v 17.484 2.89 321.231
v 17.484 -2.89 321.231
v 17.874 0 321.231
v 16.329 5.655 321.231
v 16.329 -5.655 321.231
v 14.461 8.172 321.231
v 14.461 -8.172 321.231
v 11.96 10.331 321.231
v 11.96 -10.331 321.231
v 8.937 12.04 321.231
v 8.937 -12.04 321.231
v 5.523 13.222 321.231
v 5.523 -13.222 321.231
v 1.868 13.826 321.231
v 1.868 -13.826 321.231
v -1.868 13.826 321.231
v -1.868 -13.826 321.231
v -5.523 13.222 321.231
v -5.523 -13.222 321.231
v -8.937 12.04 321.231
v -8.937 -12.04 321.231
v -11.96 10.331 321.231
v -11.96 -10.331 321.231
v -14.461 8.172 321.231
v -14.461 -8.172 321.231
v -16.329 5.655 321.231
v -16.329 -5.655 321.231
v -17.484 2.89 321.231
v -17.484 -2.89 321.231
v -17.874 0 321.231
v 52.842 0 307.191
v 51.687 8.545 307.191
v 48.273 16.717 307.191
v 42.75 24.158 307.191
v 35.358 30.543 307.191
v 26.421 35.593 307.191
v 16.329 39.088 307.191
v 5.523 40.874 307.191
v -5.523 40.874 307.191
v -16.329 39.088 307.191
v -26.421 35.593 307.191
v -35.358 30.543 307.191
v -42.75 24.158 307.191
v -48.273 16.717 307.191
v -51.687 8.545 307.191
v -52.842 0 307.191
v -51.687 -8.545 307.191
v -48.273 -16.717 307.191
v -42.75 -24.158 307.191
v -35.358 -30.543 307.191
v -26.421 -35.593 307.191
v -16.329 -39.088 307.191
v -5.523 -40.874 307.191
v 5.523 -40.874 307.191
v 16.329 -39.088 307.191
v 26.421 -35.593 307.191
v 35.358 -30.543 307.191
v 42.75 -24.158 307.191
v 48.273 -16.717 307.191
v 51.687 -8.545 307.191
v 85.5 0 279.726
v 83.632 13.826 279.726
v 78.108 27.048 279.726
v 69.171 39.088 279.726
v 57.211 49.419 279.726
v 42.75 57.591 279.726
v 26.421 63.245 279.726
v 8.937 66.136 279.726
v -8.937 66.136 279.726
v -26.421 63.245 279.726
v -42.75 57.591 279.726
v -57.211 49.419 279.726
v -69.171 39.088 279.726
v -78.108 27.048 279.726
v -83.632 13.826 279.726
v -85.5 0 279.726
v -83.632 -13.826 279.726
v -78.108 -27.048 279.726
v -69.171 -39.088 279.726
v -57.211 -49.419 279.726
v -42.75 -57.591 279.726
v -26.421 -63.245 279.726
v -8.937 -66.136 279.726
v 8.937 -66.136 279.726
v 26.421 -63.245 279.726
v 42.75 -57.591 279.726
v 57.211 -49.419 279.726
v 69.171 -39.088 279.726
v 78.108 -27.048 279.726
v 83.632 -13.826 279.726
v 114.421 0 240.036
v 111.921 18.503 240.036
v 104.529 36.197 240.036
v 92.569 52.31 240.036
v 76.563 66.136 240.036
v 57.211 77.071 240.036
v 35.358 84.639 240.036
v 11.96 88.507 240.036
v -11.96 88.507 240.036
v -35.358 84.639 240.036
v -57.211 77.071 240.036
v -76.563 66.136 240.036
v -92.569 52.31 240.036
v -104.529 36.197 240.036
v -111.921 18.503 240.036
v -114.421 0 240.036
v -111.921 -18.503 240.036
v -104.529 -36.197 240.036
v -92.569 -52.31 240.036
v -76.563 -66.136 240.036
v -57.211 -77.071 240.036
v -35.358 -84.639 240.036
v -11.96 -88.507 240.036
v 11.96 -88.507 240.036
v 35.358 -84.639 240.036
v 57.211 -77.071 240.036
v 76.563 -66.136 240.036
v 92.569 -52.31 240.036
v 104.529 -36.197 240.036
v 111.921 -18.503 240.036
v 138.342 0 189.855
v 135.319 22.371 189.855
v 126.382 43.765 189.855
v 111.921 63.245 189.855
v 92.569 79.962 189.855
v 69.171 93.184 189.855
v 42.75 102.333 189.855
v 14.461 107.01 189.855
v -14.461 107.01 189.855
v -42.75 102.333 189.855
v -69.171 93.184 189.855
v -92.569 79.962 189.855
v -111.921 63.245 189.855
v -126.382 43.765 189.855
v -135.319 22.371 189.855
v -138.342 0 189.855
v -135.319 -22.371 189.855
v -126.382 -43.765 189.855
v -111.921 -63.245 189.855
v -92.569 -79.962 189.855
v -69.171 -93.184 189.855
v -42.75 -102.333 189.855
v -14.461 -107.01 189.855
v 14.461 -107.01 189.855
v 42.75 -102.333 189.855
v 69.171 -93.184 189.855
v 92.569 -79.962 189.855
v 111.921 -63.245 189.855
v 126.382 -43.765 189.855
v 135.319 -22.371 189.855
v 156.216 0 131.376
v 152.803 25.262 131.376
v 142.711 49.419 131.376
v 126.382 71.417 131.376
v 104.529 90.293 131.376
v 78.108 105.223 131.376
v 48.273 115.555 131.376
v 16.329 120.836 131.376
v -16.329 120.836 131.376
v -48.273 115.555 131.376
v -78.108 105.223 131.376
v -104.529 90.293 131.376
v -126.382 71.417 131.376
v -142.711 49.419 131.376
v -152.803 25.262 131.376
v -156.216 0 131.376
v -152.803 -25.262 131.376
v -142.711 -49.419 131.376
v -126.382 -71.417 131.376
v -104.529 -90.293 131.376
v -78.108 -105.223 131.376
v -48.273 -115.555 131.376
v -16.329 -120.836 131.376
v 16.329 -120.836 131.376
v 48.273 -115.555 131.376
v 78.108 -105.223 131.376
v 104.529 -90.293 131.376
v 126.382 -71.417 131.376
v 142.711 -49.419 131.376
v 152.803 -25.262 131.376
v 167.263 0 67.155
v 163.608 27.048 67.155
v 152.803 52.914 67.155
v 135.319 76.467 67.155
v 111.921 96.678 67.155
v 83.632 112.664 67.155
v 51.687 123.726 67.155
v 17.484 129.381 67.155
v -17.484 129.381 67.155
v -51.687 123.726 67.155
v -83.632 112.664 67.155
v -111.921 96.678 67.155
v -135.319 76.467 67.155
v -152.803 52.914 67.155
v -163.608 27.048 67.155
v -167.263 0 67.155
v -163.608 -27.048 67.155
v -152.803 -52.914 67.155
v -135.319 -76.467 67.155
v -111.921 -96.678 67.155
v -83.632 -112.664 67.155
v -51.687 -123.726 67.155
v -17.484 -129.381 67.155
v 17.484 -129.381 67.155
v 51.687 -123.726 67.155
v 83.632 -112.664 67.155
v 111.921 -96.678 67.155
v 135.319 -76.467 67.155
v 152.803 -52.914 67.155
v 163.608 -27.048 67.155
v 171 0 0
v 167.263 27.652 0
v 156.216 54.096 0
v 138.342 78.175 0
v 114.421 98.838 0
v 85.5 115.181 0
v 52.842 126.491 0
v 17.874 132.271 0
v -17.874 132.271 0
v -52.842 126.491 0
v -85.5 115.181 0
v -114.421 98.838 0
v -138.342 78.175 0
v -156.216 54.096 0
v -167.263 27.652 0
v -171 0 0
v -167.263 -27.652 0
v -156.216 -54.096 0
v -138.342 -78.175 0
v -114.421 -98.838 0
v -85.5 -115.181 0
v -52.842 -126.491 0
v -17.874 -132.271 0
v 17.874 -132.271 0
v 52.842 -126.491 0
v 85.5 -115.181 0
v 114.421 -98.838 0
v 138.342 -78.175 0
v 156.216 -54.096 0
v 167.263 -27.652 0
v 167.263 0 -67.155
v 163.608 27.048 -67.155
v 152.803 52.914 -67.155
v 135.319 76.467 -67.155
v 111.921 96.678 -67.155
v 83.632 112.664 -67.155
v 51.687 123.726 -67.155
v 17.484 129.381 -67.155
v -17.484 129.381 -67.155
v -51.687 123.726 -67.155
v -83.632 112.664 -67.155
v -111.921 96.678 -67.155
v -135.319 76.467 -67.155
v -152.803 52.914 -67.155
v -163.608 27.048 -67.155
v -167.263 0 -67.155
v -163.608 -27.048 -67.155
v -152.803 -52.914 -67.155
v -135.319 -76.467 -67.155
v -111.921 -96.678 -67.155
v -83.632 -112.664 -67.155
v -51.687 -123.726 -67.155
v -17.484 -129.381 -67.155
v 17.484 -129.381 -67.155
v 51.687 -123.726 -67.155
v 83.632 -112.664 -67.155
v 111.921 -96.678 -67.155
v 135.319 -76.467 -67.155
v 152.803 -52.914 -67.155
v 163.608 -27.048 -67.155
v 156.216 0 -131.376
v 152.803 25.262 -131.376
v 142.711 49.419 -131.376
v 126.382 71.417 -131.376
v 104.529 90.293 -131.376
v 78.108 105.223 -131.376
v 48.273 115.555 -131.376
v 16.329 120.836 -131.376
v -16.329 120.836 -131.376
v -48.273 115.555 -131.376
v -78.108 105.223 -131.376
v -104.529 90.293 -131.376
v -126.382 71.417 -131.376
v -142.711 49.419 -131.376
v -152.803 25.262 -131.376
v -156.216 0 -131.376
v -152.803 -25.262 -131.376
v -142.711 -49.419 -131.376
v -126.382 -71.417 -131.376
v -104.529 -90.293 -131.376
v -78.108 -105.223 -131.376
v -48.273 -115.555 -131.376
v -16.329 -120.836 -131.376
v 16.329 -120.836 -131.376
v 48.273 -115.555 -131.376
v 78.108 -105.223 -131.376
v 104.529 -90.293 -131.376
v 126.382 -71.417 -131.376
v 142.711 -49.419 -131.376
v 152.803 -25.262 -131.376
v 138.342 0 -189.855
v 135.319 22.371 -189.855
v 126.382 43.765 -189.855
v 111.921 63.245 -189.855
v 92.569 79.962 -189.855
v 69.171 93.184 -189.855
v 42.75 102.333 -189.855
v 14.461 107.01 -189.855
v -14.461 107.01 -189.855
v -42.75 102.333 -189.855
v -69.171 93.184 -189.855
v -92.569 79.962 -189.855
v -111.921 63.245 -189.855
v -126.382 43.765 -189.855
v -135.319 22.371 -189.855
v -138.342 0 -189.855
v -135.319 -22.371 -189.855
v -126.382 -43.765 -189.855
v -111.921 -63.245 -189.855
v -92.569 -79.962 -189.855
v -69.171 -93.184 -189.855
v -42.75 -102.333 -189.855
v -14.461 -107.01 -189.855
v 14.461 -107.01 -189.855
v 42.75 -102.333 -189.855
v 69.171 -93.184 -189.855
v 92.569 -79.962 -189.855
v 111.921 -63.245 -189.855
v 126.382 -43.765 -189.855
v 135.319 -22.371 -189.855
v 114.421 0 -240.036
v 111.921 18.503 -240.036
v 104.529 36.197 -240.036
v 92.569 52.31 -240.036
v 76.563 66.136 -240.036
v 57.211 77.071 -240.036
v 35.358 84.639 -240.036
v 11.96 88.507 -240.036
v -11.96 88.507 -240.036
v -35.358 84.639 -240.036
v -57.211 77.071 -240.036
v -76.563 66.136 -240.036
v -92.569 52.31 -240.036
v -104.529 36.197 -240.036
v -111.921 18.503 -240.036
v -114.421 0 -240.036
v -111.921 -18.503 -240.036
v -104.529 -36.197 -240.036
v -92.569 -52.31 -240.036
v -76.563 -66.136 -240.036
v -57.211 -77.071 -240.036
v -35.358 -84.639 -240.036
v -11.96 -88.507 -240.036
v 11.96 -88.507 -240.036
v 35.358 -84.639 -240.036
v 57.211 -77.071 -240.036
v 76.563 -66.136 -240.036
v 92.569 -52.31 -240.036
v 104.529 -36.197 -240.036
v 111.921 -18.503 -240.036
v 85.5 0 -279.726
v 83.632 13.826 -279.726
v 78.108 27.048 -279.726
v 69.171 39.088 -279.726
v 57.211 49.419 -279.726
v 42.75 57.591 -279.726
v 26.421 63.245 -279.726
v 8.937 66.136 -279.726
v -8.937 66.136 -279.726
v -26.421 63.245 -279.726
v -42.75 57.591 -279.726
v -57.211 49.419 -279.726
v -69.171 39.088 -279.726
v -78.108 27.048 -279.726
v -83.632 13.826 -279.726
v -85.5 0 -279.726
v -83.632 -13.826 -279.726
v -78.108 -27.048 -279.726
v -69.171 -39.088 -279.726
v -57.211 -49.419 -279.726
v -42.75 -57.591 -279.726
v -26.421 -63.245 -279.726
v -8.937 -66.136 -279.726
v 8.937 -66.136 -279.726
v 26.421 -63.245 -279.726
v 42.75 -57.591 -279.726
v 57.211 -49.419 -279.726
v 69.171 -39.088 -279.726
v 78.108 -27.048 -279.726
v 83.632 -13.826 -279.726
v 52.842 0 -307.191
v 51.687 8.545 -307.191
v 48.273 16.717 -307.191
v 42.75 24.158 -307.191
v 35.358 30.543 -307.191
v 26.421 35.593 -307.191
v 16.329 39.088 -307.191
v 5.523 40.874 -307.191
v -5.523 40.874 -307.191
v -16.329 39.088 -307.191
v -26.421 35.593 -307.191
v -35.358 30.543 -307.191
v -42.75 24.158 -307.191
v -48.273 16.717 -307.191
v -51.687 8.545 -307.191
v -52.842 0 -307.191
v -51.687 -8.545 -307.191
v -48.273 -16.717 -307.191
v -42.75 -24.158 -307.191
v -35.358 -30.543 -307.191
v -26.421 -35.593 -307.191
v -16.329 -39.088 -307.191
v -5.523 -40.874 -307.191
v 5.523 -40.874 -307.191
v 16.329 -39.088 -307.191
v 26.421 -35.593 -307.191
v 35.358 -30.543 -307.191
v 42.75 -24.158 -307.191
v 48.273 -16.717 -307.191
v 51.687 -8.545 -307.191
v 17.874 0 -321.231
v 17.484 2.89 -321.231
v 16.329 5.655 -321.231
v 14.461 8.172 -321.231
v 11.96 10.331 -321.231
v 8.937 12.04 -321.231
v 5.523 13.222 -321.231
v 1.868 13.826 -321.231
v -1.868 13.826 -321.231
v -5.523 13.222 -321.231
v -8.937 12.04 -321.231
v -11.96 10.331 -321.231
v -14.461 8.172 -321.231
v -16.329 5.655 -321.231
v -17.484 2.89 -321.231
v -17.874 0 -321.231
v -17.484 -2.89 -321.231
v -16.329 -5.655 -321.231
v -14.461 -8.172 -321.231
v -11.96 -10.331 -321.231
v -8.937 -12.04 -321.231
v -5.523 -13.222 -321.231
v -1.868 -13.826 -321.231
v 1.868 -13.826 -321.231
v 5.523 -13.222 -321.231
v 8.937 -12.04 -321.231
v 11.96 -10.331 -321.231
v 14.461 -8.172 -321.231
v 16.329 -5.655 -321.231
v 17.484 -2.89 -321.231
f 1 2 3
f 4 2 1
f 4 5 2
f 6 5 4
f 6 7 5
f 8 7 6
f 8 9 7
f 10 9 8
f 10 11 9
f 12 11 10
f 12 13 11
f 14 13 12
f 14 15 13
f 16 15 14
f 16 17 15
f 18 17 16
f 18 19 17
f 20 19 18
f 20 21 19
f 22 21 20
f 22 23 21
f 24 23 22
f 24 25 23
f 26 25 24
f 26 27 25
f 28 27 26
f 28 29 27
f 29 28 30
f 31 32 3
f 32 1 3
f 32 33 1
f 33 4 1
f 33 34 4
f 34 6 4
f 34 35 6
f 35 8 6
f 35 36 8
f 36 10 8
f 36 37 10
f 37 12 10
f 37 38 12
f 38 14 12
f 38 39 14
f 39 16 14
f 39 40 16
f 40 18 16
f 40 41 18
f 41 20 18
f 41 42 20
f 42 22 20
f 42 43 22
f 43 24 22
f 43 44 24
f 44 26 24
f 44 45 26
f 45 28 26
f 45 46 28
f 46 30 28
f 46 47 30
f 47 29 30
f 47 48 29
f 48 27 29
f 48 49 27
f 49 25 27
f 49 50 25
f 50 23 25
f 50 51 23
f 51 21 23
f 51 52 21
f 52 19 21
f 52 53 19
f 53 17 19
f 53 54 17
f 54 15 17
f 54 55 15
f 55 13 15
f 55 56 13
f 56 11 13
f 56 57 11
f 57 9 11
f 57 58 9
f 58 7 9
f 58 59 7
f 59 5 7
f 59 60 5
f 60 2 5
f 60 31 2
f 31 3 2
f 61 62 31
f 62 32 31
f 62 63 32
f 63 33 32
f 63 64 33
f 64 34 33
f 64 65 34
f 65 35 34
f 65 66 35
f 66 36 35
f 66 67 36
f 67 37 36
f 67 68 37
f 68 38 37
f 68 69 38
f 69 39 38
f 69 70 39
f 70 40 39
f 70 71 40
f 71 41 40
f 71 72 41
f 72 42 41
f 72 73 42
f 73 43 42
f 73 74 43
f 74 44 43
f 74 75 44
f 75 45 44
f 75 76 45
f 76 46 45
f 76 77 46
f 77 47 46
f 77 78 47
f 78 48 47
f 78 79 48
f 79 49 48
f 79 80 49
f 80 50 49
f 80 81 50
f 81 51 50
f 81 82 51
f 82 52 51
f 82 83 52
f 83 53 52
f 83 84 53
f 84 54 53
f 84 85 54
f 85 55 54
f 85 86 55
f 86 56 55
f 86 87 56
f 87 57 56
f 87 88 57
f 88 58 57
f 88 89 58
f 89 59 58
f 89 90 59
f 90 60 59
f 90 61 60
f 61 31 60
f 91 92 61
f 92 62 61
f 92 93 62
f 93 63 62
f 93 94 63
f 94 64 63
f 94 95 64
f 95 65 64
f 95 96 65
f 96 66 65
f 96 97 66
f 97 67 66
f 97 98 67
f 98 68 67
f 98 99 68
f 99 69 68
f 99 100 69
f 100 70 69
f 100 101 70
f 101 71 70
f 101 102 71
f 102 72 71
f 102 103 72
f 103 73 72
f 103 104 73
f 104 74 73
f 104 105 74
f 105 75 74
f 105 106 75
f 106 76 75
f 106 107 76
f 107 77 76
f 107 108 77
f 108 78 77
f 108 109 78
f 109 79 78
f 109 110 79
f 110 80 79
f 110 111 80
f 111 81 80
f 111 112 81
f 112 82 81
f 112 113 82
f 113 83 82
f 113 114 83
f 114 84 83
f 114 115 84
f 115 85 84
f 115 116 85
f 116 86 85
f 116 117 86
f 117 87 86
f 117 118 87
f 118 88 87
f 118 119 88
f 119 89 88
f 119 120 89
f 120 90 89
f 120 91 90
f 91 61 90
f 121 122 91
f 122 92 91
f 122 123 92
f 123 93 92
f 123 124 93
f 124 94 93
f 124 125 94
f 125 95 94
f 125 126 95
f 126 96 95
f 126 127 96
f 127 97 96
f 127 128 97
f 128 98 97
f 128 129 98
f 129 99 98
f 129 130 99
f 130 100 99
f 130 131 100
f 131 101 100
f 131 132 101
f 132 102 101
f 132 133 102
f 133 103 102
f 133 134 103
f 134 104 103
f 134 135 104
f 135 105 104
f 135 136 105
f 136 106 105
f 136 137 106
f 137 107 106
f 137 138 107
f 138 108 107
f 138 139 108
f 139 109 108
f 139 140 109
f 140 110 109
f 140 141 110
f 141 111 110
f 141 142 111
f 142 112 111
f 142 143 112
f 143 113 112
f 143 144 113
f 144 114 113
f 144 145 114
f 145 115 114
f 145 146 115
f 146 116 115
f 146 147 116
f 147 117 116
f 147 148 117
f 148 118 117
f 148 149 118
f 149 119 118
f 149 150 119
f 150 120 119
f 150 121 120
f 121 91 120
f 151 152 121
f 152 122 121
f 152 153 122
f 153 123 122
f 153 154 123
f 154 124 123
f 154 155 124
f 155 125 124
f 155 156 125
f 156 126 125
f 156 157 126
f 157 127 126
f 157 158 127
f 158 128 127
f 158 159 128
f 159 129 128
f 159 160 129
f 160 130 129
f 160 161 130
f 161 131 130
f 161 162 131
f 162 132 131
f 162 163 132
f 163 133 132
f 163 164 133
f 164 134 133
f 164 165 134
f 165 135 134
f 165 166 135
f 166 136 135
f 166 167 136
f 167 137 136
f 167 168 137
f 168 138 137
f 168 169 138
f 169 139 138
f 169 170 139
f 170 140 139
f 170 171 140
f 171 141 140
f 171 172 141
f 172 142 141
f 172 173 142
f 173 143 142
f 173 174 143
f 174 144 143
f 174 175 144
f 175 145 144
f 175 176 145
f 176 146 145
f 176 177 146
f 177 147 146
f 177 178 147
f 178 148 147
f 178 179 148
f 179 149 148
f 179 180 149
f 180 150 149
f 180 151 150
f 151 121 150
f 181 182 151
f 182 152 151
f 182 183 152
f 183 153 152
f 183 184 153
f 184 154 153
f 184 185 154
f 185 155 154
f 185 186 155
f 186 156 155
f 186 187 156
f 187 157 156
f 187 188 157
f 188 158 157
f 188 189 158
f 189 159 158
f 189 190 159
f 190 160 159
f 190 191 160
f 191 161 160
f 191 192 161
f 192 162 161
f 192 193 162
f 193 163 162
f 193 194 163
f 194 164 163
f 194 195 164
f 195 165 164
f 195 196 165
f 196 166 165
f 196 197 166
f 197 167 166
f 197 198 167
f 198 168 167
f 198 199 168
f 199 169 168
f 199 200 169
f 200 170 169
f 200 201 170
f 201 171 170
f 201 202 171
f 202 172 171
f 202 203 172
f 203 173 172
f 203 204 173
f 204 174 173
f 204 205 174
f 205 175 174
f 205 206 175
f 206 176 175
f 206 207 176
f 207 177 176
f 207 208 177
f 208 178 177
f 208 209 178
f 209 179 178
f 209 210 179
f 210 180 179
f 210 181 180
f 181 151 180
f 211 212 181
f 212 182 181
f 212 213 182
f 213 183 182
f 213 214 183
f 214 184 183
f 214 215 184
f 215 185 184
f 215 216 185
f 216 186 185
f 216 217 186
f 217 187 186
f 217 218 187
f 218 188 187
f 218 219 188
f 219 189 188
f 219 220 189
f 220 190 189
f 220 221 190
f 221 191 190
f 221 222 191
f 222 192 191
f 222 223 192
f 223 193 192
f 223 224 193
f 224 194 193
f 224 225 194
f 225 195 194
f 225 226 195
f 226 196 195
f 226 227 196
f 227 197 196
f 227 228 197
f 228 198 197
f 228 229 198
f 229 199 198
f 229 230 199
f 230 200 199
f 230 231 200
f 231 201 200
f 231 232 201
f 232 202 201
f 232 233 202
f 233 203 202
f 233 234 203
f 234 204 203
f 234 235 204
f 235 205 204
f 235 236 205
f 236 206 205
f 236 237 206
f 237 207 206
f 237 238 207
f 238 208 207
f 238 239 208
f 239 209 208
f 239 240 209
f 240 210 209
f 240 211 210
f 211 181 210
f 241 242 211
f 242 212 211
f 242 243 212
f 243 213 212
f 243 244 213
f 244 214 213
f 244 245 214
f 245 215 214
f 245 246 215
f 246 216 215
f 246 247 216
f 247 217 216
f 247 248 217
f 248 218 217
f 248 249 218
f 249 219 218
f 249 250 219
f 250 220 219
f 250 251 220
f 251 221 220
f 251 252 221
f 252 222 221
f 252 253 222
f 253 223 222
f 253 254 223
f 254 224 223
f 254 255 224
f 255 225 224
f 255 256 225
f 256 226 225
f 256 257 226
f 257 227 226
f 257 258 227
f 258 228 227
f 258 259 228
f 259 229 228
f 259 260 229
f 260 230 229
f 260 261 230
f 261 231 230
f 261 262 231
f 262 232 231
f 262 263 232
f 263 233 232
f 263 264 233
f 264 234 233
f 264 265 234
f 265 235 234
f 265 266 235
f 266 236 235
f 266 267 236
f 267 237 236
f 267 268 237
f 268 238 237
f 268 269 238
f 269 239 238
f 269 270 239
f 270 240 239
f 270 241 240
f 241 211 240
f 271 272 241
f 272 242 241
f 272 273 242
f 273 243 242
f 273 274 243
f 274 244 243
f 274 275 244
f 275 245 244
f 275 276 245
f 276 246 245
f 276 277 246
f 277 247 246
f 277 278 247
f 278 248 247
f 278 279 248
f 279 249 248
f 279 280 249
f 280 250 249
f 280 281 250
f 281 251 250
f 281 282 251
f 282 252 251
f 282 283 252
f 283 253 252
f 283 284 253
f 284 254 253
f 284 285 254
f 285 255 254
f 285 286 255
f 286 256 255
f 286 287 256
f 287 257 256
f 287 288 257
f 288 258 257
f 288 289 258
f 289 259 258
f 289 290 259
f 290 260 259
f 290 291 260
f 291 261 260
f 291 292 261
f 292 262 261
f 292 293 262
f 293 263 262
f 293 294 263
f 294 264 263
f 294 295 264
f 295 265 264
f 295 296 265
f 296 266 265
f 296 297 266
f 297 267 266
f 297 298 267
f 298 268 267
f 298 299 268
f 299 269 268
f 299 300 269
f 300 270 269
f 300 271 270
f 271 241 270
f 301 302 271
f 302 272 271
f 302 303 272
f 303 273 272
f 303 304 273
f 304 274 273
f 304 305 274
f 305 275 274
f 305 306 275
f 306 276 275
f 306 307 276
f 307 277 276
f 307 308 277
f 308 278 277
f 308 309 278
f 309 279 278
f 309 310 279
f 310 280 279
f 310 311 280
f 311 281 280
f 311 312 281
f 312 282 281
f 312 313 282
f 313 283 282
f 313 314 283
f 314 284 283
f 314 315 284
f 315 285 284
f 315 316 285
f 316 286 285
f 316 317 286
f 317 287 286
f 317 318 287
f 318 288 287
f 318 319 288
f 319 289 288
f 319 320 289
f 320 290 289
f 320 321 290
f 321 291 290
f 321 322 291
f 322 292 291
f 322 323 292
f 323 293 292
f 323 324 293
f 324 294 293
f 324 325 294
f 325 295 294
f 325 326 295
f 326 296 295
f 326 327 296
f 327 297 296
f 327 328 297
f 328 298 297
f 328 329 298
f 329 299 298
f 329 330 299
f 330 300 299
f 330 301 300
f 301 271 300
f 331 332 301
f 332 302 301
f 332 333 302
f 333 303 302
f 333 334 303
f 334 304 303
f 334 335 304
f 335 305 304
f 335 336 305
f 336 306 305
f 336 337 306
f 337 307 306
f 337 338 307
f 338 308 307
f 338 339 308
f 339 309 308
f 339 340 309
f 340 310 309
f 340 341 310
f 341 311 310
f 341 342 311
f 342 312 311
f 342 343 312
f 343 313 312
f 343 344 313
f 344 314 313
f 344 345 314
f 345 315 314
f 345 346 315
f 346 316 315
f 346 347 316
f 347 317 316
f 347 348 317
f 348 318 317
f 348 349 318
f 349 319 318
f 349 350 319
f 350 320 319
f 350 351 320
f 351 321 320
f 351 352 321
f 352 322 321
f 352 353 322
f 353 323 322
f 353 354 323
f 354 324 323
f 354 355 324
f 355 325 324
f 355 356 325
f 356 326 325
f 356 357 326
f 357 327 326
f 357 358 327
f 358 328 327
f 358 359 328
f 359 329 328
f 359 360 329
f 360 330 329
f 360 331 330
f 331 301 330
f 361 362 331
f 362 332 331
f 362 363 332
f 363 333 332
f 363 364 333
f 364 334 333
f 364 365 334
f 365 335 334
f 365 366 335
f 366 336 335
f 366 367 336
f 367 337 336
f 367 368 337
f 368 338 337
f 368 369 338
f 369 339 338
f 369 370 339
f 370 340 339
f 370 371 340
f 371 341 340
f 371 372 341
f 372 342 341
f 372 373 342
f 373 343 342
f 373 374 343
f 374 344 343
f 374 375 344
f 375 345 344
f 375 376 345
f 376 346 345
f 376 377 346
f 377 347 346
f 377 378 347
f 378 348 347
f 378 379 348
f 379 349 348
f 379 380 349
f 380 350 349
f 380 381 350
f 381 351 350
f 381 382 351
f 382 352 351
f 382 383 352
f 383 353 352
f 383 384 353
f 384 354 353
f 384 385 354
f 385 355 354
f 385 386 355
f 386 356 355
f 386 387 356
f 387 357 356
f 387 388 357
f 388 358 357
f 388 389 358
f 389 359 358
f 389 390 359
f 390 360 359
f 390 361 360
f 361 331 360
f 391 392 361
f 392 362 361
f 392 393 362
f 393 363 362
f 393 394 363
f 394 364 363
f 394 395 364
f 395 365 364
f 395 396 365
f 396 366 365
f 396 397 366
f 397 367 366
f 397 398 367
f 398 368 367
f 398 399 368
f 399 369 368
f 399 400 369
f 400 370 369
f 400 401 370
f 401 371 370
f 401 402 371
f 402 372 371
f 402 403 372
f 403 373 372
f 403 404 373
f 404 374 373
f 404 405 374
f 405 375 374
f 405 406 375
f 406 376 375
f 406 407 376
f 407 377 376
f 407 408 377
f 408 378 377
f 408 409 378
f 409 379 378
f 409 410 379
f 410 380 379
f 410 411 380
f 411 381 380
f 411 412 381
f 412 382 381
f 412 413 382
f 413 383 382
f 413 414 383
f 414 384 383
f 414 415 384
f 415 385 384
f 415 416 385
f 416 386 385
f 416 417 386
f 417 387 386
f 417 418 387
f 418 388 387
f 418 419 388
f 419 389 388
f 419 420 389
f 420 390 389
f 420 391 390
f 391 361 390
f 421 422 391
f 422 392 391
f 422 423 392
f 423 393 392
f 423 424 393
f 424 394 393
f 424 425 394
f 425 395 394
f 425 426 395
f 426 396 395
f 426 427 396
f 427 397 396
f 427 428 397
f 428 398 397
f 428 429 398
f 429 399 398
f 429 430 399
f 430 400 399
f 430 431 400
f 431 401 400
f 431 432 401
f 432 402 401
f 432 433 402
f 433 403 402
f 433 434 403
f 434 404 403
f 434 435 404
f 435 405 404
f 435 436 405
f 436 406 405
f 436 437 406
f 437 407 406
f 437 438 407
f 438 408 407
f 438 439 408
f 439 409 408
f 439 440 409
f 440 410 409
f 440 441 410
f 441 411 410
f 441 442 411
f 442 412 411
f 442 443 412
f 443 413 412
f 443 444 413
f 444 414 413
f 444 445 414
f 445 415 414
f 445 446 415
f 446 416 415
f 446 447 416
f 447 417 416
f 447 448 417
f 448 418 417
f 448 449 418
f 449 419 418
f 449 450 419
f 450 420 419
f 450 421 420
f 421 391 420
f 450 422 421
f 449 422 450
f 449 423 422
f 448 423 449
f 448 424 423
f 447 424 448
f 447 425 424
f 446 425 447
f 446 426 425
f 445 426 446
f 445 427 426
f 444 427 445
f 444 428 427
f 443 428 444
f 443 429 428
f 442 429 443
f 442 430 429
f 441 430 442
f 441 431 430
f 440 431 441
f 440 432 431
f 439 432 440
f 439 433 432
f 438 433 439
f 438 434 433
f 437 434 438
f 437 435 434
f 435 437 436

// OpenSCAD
// Generated by SolidPython 1.0.1 on 2020-07-29 00:46:48


scale(v = [9, 7, 17]) {
	sphere(r = 19);
}
/***********************************************
*********      SolidPython code:      **********
************************************************
 
# import packages: SolidPython
from solid import *
from solid.utils import *
from itertools import chain, combinations, permutations


class Resize:

    def __init__(self, scad_file):
        self.scad_file = scad_file
        #self.scad_file = import_scad(scad_file)
        # cone/cylinder param:
        self.r1 = 0
        self.r2 = 0
        self.h = 0
        # rectangular prism param:
        self.w = 0
        self.l = 0
        # ellipse param:
        self.r = 0

    # import OpenScad code (file name corresponds to shape)


    # classify shape + parameters
    def assign(self, param1, param2, param3):
        if self.scad_file == 'cone.scad':
            self.r1 = param1
            self.r2 = param2
            self.h = param3
        elif self.scad_file == 'cylinder.scad':
            self.r1 = param1
            self.r2 = param2
            self.h = param3
        elif self.scad_file == 'rectangularPrism.scad':
            self.h = param1
            self.l = param2
            self.w = param3
        else:
            self.r = param1
            self.h = param2

    # resize parameters
    def iterate(self):
        x = range(3, 20, 2)
        i = 1
        if self.scad_file == 'cone.scad':
            tempList = list(permutations(x, 2))
            for temp in tempList:
                param1 = temp[0]
                param2 = temp[1]
                filepath = 'produced_scad_files/' + 'cone' + str(param1) + '_' + str(param2) + '_' + '.scad'
                scad_render_to_file(cylinder(h=param1, r1=param2, r2=0), filepath)

        elif self.scad_file == 'cylinder.scad':
            tempList = list(permutations(x, 3))
            for temp in tempList:
                param1 = temp[0]
                param2 = temp[1]
                filepath = 'produced_scad_files/' + 'cylinder' + str(param1) + '_' + str(param2) + '_' + '.scad'
                scad_render_to_file(cylinder(h=param1, r1=param2, r2=param2), filepath)

        elif self.scad_file == 'rectangularPrism.scad':
            tempList = list(permutations(x, 3))
            for temp in tempList:
                param1 = temp[0]
                param2 = temp[1]
                param3 = temp[2]
                filepath = 'produced_scad_files/' + 'rectangularPrism' + str(param1) + '_' + str(param2) + '_' + str(
                    param3) + '.scad'
                scad_render_to_file(cube(size=(param1, param2, param3)), filepath)

        elif self.scad_file == 'ellipse.scad':
            tempList = list(permutations(x, 4))
            for temp in tempList:
                param1 = temp[0]
                param2 = temp[1]
                param3 = temp[2]
                param4 = temp[3]
                filepath = 'produced_scad_files/' + 'ellipse' + str(param1) + '_' + str(param2) + '_' + str(param3) + '_' + str(param4) + '.scad'
                scad_render_to_file(scale([param1, param2, param3])(sphere(r=param4)), filepath)

    def render_to_scadfile(self):
        scad_render_to_file(scad, 'example.scad') 
 
************************************************/
